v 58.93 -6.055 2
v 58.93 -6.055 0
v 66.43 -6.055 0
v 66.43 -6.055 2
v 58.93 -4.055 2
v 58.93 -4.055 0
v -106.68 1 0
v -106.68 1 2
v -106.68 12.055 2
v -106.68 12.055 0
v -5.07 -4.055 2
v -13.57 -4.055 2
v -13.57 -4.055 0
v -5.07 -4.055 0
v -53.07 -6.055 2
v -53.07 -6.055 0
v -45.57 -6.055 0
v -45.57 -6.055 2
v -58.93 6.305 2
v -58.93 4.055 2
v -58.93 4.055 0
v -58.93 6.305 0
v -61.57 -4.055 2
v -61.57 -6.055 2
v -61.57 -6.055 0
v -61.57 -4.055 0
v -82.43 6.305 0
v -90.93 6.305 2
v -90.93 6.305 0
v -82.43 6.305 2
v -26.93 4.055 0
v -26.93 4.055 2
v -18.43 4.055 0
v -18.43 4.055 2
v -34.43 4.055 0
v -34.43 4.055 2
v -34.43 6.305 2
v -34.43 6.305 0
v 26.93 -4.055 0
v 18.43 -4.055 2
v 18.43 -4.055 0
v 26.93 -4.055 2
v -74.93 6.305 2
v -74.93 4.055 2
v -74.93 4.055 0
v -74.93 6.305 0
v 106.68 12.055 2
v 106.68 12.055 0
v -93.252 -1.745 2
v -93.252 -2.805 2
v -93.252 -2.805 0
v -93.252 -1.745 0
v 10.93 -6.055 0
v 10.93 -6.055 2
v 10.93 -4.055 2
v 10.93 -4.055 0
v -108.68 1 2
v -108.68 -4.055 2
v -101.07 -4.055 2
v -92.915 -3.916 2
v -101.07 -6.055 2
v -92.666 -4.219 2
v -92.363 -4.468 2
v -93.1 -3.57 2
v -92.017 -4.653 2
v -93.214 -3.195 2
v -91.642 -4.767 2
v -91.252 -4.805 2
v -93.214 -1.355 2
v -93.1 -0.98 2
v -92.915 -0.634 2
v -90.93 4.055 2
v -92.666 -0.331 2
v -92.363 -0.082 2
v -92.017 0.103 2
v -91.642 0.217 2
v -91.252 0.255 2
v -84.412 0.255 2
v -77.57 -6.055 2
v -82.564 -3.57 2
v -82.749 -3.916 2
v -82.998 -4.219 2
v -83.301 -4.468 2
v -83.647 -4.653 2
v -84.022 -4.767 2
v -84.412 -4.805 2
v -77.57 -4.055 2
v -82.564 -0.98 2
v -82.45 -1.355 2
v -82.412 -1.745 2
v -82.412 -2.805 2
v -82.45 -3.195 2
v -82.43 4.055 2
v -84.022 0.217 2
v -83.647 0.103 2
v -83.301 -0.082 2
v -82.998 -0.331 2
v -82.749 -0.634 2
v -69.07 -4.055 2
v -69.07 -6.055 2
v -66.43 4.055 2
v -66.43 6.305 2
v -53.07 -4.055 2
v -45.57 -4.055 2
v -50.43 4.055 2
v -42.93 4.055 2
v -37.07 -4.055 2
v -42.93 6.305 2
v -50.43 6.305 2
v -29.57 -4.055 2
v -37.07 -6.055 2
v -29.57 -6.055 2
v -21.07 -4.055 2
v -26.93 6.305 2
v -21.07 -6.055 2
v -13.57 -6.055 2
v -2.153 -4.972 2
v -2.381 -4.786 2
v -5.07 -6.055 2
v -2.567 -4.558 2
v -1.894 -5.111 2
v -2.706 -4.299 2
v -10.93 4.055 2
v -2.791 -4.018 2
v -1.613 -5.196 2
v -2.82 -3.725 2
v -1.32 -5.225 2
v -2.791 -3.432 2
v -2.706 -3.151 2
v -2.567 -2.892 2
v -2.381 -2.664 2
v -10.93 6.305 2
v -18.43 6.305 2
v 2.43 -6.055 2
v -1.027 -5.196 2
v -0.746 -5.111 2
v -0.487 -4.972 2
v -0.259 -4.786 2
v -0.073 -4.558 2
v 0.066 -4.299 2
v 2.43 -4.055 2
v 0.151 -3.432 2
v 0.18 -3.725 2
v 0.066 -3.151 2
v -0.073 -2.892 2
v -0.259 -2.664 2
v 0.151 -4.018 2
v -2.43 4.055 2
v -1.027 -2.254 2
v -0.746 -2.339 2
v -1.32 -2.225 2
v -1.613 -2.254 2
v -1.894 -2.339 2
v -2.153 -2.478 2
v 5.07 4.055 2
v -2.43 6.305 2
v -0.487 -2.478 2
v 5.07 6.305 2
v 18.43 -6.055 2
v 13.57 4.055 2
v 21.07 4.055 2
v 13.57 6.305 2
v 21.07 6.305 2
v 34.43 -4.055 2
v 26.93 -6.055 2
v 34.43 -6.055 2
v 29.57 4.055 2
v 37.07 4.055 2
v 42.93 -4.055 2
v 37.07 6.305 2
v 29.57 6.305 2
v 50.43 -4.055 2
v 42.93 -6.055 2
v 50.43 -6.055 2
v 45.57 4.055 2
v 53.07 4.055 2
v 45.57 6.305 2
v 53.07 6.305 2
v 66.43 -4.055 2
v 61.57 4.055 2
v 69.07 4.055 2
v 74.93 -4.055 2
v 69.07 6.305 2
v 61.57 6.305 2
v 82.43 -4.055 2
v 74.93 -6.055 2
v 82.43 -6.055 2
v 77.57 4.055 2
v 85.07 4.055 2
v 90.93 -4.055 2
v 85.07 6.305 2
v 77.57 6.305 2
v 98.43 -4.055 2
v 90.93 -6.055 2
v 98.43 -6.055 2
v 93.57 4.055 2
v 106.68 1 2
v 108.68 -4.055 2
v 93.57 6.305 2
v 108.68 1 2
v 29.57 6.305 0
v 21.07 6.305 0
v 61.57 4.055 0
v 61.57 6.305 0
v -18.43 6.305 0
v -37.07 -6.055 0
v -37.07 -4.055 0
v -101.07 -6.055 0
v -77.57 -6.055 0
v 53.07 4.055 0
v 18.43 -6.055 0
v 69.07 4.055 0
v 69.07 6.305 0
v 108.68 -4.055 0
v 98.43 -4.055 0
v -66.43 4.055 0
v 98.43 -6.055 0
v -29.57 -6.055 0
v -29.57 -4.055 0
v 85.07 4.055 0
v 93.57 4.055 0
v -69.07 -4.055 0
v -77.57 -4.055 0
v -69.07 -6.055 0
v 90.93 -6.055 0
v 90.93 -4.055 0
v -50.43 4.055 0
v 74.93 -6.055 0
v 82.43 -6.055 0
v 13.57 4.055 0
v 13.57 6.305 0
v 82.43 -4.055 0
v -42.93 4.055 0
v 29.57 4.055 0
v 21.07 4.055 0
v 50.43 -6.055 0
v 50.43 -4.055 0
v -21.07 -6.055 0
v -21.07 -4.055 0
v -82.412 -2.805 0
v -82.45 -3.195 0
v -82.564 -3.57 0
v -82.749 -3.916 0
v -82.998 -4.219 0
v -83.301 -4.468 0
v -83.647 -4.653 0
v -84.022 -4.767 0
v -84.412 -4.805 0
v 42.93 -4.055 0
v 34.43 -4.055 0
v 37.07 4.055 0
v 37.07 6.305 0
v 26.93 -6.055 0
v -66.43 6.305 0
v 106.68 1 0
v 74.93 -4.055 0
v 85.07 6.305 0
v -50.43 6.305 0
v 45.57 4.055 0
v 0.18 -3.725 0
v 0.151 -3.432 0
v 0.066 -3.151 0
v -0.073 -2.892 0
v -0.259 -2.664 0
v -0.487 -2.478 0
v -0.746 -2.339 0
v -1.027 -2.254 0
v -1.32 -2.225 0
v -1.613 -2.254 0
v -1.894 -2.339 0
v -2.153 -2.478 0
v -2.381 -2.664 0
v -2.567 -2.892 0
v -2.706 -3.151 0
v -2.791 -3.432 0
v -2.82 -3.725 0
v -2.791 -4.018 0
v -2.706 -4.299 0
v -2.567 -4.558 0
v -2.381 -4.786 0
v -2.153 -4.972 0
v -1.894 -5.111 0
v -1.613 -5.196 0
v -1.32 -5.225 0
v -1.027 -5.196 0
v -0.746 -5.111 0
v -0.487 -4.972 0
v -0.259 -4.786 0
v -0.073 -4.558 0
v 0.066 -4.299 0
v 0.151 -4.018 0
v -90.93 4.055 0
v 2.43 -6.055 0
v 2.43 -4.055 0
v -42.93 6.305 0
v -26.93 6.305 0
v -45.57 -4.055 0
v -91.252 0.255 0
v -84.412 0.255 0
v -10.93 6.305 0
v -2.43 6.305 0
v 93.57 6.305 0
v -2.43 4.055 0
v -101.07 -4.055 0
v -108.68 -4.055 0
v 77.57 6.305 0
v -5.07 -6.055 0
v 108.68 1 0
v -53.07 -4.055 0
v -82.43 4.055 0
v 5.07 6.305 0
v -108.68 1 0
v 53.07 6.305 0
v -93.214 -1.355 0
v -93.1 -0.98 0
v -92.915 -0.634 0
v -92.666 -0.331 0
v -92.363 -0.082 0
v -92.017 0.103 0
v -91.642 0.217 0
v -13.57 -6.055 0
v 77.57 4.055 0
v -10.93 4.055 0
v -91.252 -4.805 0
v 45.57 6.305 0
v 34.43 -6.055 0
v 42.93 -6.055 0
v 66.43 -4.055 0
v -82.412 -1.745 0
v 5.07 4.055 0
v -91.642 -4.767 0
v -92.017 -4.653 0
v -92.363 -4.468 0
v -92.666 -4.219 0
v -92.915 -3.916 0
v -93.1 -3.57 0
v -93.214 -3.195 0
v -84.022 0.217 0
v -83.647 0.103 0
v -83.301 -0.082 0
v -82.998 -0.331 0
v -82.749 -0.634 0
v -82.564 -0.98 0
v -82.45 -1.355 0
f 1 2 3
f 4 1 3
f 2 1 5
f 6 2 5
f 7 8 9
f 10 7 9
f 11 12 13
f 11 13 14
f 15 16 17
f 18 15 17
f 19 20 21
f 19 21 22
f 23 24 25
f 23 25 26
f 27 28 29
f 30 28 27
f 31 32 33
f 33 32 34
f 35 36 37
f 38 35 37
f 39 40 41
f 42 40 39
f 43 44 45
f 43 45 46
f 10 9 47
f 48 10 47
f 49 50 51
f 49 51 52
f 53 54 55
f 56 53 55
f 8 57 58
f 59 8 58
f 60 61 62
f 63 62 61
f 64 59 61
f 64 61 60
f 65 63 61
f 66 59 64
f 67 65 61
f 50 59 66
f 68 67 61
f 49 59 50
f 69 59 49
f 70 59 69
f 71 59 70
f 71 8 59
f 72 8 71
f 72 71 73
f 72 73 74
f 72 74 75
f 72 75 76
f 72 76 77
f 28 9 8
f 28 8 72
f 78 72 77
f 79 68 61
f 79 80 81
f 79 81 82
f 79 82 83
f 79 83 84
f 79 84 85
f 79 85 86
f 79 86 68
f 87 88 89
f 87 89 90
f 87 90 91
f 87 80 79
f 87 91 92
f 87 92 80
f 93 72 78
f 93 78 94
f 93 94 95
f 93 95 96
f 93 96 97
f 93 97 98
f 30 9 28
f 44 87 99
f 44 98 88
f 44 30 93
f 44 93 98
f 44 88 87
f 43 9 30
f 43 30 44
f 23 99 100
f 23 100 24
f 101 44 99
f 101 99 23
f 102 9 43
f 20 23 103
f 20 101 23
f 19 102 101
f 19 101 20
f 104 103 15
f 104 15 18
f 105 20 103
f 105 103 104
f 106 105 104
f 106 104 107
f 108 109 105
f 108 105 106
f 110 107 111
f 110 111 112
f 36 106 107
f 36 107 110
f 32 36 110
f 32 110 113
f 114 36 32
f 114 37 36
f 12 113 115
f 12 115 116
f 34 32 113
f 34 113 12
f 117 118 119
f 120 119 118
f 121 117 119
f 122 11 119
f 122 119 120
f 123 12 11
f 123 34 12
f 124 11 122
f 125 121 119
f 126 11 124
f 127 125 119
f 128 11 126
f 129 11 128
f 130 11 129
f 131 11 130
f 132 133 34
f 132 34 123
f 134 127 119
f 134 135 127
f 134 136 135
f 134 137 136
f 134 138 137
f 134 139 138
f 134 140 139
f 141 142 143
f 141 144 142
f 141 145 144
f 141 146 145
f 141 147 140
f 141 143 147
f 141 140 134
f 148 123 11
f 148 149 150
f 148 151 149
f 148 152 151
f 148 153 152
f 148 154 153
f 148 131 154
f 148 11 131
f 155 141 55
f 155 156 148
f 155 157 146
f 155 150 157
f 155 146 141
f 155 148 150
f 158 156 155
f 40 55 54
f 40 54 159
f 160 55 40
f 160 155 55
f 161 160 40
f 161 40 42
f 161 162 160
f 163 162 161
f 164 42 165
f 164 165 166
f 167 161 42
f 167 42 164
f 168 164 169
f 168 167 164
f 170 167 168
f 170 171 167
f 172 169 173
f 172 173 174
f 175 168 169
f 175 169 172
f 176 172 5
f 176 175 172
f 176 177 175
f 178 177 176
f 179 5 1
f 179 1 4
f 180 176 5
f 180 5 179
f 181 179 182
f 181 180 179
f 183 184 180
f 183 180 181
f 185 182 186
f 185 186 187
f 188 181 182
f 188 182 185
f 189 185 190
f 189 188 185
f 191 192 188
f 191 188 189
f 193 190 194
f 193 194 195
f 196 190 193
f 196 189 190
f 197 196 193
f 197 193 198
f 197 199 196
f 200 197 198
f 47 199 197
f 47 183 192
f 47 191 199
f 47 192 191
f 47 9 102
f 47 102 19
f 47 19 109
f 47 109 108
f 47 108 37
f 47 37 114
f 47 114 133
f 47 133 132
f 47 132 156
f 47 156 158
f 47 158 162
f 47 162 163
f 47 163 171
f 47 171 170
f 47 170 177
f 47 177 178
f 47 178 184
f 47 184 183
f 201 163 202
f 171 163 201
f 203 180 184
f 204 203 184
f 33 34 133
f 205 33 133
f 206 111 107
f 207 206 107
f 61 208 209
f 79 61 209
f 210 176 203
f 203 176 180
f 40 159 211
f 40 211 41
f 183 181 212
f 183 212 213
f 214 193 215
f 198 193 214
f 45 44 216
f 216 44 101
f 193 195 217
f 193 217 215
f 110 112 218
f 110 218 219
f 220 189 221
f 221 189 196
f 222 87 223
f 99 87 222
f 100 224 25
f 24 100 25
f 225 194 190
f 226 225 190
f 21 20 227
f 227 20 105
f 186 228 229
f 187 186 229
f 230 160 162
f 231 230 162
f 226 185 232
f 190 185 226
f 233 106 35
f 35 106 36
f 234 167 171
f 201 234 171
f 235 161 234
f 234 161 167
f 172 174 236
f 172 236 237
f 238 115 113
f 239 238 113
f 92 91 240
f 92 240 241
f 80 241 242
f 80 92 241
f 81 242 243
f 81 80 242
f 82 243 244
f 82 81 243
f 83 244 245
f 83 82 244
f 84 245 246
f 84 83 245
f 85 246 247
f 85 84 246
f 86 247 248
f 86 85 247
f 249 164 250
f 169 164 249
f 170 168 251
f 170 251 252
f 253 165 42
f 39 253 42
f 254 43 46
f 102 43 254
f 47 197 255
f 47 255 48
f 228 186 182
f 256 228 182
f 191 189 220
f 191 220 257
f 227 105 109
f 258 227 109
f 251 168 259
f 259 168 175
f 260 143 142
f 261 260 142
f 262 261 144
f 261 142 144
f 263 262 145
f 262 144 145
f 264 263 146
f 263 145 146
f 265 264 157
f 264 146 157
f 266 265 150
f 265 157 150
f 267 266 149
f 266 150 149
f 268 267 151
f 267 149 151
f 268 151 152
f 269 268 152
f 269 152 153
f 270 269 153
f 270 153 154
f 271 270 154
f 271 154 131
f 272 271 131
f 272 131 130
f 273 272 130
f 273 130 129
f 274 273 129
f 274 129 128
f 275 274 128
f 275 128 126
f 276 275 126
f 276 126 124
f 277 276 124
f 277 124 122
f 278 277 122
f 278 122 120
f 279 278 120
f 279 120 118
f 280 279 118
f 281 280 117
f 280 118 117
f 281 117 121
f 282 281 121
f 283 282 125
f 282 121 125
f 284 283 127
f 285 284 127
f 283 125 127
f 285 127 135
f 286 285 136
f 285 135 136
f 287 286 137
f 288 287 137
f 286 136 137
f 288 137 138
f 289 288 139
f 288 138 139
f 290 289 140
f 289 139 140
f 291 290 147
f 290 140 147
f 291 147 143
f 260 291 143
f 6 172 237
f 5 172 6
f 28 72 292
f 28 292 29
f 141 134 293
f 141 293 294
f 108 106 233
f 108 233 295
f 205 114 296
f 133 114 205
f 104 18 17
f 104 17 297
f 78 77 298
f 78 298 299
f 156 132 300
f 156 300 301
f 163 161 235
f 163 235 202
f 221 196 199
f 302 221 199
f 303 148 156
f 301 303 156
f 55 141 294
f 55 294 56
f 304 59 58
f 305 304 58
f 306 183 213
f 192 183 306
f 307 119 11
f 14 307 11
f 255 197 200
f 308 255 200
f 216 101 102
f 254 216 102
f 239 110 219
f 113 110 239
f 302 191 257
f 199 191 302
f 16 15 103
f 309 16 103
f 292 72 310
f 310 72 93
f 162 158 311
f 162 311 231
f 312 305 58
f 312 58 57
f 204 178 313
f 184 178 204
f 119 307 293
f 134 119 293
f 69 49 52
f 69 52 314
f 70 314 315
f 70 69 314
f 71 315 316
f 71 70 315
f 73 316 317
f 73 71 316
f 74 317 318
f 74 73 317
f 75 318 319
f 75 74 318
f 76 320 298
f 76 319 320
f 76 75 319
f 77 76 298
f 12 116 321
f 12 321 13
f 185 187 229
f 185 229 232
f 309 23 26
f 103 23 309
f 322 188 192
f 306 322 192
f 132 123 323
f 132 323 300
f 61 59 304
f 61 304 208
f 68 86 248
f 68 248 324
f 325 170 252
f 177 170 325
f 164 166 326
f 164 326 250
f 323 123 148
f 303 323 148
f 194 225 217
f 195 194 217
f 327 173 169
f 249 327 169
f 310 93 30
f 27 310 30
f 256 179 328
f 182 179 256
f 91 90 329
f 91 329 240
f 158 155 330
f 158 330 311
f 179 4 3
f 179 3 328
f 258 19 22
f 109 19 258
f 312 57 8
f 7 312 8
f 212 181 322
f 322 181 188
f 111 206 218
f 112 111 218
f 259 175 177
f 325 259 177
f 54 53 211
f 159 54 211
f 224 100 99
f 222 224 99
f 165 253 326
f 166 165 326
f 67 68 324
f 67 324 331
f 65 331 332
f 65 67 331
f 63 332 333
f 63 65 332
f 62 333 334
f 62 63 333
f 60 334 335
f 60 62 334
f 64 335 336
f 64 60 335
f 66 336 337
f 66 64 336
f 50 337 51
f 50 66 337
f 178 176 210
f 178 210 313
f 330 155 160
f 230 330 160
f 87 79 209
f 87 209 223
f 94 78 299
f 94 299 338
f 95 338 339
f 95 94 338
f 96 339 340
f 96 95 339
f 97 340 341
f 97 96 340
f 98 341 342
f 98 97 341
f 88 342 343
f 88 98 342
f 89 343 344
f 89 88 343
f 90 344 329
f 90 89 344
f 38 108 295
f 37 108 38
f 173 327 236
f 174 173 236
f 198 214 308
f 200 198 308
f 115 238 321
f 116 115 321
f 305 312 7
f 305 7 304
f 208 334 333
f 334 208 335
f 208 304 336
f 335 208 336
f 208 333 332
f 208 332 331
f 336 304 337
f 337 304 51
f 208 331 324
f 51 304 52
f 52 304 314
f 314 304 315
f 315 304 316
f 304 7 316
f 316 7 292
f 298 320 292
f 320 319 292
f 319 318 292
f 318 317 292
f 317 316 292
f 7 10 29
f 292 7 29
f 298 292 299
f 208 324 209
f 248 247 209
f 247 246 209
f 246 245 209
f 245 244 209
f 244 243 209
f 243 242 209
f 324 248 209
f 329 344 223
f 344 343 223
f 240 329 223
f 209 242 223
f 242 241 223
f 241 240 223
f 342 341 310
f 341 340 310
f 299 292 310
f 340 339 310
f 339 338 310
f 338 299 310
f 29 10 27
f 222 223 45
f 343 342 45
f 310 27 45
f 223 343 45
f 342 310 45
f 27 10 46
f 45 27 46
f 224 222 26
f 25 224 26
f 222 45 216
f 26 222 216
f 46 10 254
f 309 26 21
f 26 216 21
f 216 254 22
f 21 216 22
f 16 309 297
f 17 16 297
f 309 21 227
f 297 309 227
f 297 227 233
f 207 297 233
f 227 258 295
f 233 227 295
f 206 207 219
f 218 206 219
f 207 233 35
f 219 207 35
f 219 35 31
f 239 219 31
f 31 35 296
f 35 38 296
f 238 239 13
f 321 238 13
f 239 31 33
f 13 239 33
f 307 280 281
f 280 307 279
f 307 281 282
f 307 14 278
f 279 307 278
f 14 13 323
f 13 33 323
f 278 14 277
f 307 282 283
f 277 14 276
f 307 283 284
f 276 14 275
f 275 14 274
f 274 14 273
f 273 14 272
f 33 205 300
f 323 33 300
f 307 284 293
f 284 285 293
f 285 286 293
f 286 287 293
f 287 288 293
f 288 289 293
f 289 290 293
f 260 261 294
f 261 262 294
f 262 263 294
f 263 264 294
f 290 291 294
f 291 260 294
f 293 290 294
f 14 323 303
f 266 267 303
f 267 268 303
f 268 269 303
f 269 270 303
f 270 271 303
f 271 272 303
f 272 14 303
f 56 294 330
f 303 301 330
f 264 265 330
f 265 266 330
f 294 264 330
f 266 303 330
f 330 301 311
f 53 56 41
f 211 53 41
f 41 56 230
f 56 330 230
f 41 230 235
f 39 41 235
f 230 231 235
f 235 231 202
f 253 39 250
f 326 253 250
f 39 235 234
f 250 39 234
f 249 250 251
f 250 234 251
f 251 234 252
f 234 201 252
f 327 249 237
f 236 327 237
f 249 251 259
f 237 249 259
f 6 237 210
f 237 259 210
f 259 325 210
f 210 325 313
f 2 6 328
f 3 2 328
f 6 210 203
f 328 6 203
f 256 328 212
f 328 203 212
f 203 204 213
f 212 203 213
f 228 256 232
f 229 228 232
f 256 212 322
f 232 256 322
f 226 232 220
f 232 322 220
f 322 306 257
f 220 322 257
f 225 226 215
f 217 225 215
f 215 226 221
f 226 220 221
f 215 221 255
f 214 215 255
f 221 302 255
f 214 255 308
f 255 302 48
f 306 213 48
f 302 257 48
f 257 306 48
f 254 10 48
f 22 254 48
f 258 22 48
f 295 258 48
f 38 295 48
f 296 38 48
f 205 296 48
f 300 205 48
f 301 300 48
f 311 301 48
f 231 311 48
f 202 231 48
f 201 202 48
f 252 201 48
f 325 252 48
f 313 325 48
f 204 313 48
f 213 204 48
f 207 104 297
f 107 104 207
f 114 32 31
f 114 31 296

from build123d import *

# Parameters (mm, degrees)
ESQUISSE1_W             = 217.36
ESQUISSE1_H             = 12.11
BOSS_EXTRU_1_DEPTH      = 2
ESQUISSE2_W             = 8.5
ESQUISSE2_H             = 2
ESQUISSE2_W_2           = 10.25
ENL_V_MAT_EXTRU_1_DEPTH = 109.866916118
ENL_V_MAT_EXTRU_2_DEPTH = 109.866916118
ESQUISSE5_W             = 2
ESQUISSE5_H             = 5.055
ENL_V_MAT_EXTRU_3_DEPTH = 109.866916118
ESQUISSE6_W             = 213.36
ESQUISSE6_H             = 6
BOSS_EXTRU_2_DEPTH      = 2
ESQUISSE7_W             = 8.5
ESQUISSE7_H             = 0.25
ENL_V_MAT_EXTRU_4_DEPTH = 110.364827184
SKETCH1_R               = 1.5
CUT_EXTRUDE1_DEPTH      = 110.364827184


with BuildPart() as part:
    # Esquisse1 → Boss.-Extru.1 (new body)
    with BuildSketch(Plane.XY):
        Rectangle(ESQUISSE1_W, ESQUISSE1_H)
    extrude(amount=BOSS_EXTRU_1_DEPTH)

    # Esquisse2 → Enlèv. mat.-Extru.1 (cut, through all)
    with BuildSketch(Plane.XY.offset(2)):
        Polygon((-109.57, -4.055), (-108.68, -4.055), (-101.07, -4.055), (-101.07, -6.055), (-109.57, -6.055), align=None)
        with Locations((-86.68, 5.055)):
            Rectangle(ESQUISSE2_W, ESQUISSE2_H)
        with Locations((-73.32, -5.055)):
            Rectangle(ESQUISSE2_W, ESQUISSE2_H)
        with Locations((-57.32, -5.055)):
            Rectangle(ESQUISSE2_W, ESQUISSE2_H)
        with Locations((-41.32, -5.055)):
            Rectangle(ESQUISSE2_W, ESQUISSE2_H)
        with Locations((-25.32, -5.055)):
            Rectangle(ESQUISSE2_W, ESQUISSE2_H)
        with Locations((-9.32, -5.055)):
            Rectangle(ESQUISSE2_W, ESQUISSE2_H)
        with Locations((6.68, -5.055)):
            Rectangle(ESQUISSE2_W, ESQUISSE2_H)
        with Locations((22.68, -5.055)):
            Rectangle(ESQUISSE2_W, ESQUISSE2_H)
        with Locations((38.68, -5.055)):
            Rectangle(ESQUISSE2_W, ESQUISSE2_H)
        with Locations((54.68, -5.055)):
            Rectangle(ESQUISSE2_W, ESQUISSE2_H)
        with Locations((70.68, -5.055)):
            Rectangle(ESQUISSE2_W, ESQUISSE2_H)
        with Locations((86.68, -5.055)):
            Rectangle(ESQUISSE2_W, ESQUISSE2_H)
        with Locations((-70.68, 5.055)):
            Rectangle(ESQUISSE2_W, ESQUISSE2_H)
        with Locations((-54.68, 5.055)):
            Rectangle(ESQUISSE2_W, ESQUISSE2_H)
        with Locations((-38.68, 5.055)):
            Rectangle(ESQUISSE2_W, ESQUISSE2_H)
        with Locations((-22.68, 5.055)):
            Rectangle(ESQUISSE2_W, ESQUISSE2_H)
        with Locations((-6.68, 5.055)):
            Rectangle(ESQUISSE2_W, ESQUISSE2_H)
        with Locations((9.32, 5.055)):
            Rectangle(ESQUISSE2_W, ESQUISSE2_H)
        with Locations((25.32, 5.055)):
            Rectangle(ESQUISSE2_W, ESQUISSE2_H)
        with Locations((41.32, 5.055)):
            Rectangle(ESQUISSE2_W, ESQUISSE2_H)
        with Locations((57.32, 5.055)):
            Rectangle(ESQUISSE2_W, ESQUISSE2_H)
        with Locations((73.32, 5.055)):
            Rectangle(ESQUISSE2_W, ESQUISSE2_H)
        with Locations((89.32, 5.055)):
            Rectangle(ESQUISSE2_W, ESQUISSE2_H)
        with Locations((103.555, -5.055)):
            Rectangle(ESQUISSE2_W_2, ESQUISSE2_H)
    extrude(amount=-ENL_V_MAT_EXTRU_1_DEPTH, mode=Mode.SUBTRACT)

    # Esquisse3 → Enlèv. mat.-Extru.2 (cut, through all)
    with BuildSketch(Plane.XY.offset(2)):
        with BuildLine():
            Line((-91.252, 0.255), (-84.412, 0.255))
            ThreePointArc((-84.412, 0.255), (-82.997786438, -0.330786438), (-82.412, -1.745))
            Line((-82.412, -1.745), (-82.412, -2.805))
            ThreePointArc((-82.412, -2.805), (-82.997786438, -4.219213562), (-84.412, -4.805))
            Line((-84.412, -4.805), (-91.252, -4.805))
            ThreePointArc((-91.252, -4.805), (-92.666213562, -4.219213562), (-93.252, -2.805))
            Line((-93.252, -2.805), (-93.252, -1.745))
            ThreePointArc((-93.252, -1.745), (-92.666213562, -0.330786438), (-91.252, 0.255))
        make_face()
    extrude(amount=-ENL_V_MAT_EXTRU_2_DEPTH, mode=Mode.SUBTRACT)

    # Esquisse5 → Enlèv. mat.-Extru.3 (cut, through all)
    with BuildSketch(Plane.XY.offset(2)):
        with Locations((-107.68, 3.5275)):
            Rectangle(ESQUISSE5_W, ESQUISSE5_H)
        with Locations((107.68, 3.5275)):
            Rectangle(ESQUISSE5_W, ESQUISSE5_H)
    extrude(amount=-ENL_V_MAT_EXTRU_3_DEPTH, mode=Mode.SUBTRACT)

    # Esquisse6 → Boss.-Extru.2 (add)
    with BuildSketch(Plane.XY.offset(2)):
        with Locations((0, 9.055)):
            Rectangle(ESQUISSE6_W, ESQUISSE6_H)
    extrude(amount=-BOSS_EXTRU_2_DEPTH)

    # Esquisse7 → Enlèv. mat.-Extru.4 (cut, through all)
    with BuildSketch(Plane.XY.offset(2)):
        with Locations((-70.68, 6.18)):
            Rectangle(ESQUISSE7_W, ESQUISSE7_H)
        with Locations((-86.68, 6.18)):
            Rectangle(ESQUISSE7_W, ESQUISSE7_H)
        with Locations((-54.68, 6.18)):
            Rectangle(ESQUISSE7_W, ESQUISSE7_H)
        with Locations((-38.68, 6.18)):
            Rectangle(ESQUISSE7_W, ESQUISSE7_H)
        with Locations((-22.68, 6.18)):
            Rectangle(ESQUISSE7_W, ESQUISSE7_H)
        with Locations((-6.68, 6.18)):
            Rectangle(ESQUISSE7_W, ESQUISSE7_H)
        with Locations((9.32, 6.18)):
            Rectangle(ESQUISSE7_W, ESQUISSE7_H)
        with Locations((25.32, 6.18)):
            Rectangle(ESQUISSE7_W, ESQUISSE7_H)
        with Locations((41.32, 6.18)):
            Rectangle(ESQUISSE7_W, ESQUISSE7_H)
        with Locations((57.32, 6.18)):
            Rectangle(ESQUISSE7_W, ESQUISSE7_H)
        with Locations((73.32, 6.18)):
            Rectangle(ESQUISSE7_W, ESQUISSE7_H)
        with Locations((89.32, 6.18)):
            Rectangle(ESQUISSE7_W, ESQUISSE7_H)
    extrude(amount=-ENL_V_MAT_EXTRU_4_DEPTH, mode=Mode.SUBTRACT)

    # Sketch1 → Cut-Extrude1 (cut, through all)
    with BuildSketch(Plane.XY.offset(2)):
        with Locations((-1.32, -3.725)):
            Circle(SKETCH1_R)
    extrude(amount=-CUT_EXTRUDE1_DEPTH, mode=Mode.SUBTRACT)


solid = part.part
